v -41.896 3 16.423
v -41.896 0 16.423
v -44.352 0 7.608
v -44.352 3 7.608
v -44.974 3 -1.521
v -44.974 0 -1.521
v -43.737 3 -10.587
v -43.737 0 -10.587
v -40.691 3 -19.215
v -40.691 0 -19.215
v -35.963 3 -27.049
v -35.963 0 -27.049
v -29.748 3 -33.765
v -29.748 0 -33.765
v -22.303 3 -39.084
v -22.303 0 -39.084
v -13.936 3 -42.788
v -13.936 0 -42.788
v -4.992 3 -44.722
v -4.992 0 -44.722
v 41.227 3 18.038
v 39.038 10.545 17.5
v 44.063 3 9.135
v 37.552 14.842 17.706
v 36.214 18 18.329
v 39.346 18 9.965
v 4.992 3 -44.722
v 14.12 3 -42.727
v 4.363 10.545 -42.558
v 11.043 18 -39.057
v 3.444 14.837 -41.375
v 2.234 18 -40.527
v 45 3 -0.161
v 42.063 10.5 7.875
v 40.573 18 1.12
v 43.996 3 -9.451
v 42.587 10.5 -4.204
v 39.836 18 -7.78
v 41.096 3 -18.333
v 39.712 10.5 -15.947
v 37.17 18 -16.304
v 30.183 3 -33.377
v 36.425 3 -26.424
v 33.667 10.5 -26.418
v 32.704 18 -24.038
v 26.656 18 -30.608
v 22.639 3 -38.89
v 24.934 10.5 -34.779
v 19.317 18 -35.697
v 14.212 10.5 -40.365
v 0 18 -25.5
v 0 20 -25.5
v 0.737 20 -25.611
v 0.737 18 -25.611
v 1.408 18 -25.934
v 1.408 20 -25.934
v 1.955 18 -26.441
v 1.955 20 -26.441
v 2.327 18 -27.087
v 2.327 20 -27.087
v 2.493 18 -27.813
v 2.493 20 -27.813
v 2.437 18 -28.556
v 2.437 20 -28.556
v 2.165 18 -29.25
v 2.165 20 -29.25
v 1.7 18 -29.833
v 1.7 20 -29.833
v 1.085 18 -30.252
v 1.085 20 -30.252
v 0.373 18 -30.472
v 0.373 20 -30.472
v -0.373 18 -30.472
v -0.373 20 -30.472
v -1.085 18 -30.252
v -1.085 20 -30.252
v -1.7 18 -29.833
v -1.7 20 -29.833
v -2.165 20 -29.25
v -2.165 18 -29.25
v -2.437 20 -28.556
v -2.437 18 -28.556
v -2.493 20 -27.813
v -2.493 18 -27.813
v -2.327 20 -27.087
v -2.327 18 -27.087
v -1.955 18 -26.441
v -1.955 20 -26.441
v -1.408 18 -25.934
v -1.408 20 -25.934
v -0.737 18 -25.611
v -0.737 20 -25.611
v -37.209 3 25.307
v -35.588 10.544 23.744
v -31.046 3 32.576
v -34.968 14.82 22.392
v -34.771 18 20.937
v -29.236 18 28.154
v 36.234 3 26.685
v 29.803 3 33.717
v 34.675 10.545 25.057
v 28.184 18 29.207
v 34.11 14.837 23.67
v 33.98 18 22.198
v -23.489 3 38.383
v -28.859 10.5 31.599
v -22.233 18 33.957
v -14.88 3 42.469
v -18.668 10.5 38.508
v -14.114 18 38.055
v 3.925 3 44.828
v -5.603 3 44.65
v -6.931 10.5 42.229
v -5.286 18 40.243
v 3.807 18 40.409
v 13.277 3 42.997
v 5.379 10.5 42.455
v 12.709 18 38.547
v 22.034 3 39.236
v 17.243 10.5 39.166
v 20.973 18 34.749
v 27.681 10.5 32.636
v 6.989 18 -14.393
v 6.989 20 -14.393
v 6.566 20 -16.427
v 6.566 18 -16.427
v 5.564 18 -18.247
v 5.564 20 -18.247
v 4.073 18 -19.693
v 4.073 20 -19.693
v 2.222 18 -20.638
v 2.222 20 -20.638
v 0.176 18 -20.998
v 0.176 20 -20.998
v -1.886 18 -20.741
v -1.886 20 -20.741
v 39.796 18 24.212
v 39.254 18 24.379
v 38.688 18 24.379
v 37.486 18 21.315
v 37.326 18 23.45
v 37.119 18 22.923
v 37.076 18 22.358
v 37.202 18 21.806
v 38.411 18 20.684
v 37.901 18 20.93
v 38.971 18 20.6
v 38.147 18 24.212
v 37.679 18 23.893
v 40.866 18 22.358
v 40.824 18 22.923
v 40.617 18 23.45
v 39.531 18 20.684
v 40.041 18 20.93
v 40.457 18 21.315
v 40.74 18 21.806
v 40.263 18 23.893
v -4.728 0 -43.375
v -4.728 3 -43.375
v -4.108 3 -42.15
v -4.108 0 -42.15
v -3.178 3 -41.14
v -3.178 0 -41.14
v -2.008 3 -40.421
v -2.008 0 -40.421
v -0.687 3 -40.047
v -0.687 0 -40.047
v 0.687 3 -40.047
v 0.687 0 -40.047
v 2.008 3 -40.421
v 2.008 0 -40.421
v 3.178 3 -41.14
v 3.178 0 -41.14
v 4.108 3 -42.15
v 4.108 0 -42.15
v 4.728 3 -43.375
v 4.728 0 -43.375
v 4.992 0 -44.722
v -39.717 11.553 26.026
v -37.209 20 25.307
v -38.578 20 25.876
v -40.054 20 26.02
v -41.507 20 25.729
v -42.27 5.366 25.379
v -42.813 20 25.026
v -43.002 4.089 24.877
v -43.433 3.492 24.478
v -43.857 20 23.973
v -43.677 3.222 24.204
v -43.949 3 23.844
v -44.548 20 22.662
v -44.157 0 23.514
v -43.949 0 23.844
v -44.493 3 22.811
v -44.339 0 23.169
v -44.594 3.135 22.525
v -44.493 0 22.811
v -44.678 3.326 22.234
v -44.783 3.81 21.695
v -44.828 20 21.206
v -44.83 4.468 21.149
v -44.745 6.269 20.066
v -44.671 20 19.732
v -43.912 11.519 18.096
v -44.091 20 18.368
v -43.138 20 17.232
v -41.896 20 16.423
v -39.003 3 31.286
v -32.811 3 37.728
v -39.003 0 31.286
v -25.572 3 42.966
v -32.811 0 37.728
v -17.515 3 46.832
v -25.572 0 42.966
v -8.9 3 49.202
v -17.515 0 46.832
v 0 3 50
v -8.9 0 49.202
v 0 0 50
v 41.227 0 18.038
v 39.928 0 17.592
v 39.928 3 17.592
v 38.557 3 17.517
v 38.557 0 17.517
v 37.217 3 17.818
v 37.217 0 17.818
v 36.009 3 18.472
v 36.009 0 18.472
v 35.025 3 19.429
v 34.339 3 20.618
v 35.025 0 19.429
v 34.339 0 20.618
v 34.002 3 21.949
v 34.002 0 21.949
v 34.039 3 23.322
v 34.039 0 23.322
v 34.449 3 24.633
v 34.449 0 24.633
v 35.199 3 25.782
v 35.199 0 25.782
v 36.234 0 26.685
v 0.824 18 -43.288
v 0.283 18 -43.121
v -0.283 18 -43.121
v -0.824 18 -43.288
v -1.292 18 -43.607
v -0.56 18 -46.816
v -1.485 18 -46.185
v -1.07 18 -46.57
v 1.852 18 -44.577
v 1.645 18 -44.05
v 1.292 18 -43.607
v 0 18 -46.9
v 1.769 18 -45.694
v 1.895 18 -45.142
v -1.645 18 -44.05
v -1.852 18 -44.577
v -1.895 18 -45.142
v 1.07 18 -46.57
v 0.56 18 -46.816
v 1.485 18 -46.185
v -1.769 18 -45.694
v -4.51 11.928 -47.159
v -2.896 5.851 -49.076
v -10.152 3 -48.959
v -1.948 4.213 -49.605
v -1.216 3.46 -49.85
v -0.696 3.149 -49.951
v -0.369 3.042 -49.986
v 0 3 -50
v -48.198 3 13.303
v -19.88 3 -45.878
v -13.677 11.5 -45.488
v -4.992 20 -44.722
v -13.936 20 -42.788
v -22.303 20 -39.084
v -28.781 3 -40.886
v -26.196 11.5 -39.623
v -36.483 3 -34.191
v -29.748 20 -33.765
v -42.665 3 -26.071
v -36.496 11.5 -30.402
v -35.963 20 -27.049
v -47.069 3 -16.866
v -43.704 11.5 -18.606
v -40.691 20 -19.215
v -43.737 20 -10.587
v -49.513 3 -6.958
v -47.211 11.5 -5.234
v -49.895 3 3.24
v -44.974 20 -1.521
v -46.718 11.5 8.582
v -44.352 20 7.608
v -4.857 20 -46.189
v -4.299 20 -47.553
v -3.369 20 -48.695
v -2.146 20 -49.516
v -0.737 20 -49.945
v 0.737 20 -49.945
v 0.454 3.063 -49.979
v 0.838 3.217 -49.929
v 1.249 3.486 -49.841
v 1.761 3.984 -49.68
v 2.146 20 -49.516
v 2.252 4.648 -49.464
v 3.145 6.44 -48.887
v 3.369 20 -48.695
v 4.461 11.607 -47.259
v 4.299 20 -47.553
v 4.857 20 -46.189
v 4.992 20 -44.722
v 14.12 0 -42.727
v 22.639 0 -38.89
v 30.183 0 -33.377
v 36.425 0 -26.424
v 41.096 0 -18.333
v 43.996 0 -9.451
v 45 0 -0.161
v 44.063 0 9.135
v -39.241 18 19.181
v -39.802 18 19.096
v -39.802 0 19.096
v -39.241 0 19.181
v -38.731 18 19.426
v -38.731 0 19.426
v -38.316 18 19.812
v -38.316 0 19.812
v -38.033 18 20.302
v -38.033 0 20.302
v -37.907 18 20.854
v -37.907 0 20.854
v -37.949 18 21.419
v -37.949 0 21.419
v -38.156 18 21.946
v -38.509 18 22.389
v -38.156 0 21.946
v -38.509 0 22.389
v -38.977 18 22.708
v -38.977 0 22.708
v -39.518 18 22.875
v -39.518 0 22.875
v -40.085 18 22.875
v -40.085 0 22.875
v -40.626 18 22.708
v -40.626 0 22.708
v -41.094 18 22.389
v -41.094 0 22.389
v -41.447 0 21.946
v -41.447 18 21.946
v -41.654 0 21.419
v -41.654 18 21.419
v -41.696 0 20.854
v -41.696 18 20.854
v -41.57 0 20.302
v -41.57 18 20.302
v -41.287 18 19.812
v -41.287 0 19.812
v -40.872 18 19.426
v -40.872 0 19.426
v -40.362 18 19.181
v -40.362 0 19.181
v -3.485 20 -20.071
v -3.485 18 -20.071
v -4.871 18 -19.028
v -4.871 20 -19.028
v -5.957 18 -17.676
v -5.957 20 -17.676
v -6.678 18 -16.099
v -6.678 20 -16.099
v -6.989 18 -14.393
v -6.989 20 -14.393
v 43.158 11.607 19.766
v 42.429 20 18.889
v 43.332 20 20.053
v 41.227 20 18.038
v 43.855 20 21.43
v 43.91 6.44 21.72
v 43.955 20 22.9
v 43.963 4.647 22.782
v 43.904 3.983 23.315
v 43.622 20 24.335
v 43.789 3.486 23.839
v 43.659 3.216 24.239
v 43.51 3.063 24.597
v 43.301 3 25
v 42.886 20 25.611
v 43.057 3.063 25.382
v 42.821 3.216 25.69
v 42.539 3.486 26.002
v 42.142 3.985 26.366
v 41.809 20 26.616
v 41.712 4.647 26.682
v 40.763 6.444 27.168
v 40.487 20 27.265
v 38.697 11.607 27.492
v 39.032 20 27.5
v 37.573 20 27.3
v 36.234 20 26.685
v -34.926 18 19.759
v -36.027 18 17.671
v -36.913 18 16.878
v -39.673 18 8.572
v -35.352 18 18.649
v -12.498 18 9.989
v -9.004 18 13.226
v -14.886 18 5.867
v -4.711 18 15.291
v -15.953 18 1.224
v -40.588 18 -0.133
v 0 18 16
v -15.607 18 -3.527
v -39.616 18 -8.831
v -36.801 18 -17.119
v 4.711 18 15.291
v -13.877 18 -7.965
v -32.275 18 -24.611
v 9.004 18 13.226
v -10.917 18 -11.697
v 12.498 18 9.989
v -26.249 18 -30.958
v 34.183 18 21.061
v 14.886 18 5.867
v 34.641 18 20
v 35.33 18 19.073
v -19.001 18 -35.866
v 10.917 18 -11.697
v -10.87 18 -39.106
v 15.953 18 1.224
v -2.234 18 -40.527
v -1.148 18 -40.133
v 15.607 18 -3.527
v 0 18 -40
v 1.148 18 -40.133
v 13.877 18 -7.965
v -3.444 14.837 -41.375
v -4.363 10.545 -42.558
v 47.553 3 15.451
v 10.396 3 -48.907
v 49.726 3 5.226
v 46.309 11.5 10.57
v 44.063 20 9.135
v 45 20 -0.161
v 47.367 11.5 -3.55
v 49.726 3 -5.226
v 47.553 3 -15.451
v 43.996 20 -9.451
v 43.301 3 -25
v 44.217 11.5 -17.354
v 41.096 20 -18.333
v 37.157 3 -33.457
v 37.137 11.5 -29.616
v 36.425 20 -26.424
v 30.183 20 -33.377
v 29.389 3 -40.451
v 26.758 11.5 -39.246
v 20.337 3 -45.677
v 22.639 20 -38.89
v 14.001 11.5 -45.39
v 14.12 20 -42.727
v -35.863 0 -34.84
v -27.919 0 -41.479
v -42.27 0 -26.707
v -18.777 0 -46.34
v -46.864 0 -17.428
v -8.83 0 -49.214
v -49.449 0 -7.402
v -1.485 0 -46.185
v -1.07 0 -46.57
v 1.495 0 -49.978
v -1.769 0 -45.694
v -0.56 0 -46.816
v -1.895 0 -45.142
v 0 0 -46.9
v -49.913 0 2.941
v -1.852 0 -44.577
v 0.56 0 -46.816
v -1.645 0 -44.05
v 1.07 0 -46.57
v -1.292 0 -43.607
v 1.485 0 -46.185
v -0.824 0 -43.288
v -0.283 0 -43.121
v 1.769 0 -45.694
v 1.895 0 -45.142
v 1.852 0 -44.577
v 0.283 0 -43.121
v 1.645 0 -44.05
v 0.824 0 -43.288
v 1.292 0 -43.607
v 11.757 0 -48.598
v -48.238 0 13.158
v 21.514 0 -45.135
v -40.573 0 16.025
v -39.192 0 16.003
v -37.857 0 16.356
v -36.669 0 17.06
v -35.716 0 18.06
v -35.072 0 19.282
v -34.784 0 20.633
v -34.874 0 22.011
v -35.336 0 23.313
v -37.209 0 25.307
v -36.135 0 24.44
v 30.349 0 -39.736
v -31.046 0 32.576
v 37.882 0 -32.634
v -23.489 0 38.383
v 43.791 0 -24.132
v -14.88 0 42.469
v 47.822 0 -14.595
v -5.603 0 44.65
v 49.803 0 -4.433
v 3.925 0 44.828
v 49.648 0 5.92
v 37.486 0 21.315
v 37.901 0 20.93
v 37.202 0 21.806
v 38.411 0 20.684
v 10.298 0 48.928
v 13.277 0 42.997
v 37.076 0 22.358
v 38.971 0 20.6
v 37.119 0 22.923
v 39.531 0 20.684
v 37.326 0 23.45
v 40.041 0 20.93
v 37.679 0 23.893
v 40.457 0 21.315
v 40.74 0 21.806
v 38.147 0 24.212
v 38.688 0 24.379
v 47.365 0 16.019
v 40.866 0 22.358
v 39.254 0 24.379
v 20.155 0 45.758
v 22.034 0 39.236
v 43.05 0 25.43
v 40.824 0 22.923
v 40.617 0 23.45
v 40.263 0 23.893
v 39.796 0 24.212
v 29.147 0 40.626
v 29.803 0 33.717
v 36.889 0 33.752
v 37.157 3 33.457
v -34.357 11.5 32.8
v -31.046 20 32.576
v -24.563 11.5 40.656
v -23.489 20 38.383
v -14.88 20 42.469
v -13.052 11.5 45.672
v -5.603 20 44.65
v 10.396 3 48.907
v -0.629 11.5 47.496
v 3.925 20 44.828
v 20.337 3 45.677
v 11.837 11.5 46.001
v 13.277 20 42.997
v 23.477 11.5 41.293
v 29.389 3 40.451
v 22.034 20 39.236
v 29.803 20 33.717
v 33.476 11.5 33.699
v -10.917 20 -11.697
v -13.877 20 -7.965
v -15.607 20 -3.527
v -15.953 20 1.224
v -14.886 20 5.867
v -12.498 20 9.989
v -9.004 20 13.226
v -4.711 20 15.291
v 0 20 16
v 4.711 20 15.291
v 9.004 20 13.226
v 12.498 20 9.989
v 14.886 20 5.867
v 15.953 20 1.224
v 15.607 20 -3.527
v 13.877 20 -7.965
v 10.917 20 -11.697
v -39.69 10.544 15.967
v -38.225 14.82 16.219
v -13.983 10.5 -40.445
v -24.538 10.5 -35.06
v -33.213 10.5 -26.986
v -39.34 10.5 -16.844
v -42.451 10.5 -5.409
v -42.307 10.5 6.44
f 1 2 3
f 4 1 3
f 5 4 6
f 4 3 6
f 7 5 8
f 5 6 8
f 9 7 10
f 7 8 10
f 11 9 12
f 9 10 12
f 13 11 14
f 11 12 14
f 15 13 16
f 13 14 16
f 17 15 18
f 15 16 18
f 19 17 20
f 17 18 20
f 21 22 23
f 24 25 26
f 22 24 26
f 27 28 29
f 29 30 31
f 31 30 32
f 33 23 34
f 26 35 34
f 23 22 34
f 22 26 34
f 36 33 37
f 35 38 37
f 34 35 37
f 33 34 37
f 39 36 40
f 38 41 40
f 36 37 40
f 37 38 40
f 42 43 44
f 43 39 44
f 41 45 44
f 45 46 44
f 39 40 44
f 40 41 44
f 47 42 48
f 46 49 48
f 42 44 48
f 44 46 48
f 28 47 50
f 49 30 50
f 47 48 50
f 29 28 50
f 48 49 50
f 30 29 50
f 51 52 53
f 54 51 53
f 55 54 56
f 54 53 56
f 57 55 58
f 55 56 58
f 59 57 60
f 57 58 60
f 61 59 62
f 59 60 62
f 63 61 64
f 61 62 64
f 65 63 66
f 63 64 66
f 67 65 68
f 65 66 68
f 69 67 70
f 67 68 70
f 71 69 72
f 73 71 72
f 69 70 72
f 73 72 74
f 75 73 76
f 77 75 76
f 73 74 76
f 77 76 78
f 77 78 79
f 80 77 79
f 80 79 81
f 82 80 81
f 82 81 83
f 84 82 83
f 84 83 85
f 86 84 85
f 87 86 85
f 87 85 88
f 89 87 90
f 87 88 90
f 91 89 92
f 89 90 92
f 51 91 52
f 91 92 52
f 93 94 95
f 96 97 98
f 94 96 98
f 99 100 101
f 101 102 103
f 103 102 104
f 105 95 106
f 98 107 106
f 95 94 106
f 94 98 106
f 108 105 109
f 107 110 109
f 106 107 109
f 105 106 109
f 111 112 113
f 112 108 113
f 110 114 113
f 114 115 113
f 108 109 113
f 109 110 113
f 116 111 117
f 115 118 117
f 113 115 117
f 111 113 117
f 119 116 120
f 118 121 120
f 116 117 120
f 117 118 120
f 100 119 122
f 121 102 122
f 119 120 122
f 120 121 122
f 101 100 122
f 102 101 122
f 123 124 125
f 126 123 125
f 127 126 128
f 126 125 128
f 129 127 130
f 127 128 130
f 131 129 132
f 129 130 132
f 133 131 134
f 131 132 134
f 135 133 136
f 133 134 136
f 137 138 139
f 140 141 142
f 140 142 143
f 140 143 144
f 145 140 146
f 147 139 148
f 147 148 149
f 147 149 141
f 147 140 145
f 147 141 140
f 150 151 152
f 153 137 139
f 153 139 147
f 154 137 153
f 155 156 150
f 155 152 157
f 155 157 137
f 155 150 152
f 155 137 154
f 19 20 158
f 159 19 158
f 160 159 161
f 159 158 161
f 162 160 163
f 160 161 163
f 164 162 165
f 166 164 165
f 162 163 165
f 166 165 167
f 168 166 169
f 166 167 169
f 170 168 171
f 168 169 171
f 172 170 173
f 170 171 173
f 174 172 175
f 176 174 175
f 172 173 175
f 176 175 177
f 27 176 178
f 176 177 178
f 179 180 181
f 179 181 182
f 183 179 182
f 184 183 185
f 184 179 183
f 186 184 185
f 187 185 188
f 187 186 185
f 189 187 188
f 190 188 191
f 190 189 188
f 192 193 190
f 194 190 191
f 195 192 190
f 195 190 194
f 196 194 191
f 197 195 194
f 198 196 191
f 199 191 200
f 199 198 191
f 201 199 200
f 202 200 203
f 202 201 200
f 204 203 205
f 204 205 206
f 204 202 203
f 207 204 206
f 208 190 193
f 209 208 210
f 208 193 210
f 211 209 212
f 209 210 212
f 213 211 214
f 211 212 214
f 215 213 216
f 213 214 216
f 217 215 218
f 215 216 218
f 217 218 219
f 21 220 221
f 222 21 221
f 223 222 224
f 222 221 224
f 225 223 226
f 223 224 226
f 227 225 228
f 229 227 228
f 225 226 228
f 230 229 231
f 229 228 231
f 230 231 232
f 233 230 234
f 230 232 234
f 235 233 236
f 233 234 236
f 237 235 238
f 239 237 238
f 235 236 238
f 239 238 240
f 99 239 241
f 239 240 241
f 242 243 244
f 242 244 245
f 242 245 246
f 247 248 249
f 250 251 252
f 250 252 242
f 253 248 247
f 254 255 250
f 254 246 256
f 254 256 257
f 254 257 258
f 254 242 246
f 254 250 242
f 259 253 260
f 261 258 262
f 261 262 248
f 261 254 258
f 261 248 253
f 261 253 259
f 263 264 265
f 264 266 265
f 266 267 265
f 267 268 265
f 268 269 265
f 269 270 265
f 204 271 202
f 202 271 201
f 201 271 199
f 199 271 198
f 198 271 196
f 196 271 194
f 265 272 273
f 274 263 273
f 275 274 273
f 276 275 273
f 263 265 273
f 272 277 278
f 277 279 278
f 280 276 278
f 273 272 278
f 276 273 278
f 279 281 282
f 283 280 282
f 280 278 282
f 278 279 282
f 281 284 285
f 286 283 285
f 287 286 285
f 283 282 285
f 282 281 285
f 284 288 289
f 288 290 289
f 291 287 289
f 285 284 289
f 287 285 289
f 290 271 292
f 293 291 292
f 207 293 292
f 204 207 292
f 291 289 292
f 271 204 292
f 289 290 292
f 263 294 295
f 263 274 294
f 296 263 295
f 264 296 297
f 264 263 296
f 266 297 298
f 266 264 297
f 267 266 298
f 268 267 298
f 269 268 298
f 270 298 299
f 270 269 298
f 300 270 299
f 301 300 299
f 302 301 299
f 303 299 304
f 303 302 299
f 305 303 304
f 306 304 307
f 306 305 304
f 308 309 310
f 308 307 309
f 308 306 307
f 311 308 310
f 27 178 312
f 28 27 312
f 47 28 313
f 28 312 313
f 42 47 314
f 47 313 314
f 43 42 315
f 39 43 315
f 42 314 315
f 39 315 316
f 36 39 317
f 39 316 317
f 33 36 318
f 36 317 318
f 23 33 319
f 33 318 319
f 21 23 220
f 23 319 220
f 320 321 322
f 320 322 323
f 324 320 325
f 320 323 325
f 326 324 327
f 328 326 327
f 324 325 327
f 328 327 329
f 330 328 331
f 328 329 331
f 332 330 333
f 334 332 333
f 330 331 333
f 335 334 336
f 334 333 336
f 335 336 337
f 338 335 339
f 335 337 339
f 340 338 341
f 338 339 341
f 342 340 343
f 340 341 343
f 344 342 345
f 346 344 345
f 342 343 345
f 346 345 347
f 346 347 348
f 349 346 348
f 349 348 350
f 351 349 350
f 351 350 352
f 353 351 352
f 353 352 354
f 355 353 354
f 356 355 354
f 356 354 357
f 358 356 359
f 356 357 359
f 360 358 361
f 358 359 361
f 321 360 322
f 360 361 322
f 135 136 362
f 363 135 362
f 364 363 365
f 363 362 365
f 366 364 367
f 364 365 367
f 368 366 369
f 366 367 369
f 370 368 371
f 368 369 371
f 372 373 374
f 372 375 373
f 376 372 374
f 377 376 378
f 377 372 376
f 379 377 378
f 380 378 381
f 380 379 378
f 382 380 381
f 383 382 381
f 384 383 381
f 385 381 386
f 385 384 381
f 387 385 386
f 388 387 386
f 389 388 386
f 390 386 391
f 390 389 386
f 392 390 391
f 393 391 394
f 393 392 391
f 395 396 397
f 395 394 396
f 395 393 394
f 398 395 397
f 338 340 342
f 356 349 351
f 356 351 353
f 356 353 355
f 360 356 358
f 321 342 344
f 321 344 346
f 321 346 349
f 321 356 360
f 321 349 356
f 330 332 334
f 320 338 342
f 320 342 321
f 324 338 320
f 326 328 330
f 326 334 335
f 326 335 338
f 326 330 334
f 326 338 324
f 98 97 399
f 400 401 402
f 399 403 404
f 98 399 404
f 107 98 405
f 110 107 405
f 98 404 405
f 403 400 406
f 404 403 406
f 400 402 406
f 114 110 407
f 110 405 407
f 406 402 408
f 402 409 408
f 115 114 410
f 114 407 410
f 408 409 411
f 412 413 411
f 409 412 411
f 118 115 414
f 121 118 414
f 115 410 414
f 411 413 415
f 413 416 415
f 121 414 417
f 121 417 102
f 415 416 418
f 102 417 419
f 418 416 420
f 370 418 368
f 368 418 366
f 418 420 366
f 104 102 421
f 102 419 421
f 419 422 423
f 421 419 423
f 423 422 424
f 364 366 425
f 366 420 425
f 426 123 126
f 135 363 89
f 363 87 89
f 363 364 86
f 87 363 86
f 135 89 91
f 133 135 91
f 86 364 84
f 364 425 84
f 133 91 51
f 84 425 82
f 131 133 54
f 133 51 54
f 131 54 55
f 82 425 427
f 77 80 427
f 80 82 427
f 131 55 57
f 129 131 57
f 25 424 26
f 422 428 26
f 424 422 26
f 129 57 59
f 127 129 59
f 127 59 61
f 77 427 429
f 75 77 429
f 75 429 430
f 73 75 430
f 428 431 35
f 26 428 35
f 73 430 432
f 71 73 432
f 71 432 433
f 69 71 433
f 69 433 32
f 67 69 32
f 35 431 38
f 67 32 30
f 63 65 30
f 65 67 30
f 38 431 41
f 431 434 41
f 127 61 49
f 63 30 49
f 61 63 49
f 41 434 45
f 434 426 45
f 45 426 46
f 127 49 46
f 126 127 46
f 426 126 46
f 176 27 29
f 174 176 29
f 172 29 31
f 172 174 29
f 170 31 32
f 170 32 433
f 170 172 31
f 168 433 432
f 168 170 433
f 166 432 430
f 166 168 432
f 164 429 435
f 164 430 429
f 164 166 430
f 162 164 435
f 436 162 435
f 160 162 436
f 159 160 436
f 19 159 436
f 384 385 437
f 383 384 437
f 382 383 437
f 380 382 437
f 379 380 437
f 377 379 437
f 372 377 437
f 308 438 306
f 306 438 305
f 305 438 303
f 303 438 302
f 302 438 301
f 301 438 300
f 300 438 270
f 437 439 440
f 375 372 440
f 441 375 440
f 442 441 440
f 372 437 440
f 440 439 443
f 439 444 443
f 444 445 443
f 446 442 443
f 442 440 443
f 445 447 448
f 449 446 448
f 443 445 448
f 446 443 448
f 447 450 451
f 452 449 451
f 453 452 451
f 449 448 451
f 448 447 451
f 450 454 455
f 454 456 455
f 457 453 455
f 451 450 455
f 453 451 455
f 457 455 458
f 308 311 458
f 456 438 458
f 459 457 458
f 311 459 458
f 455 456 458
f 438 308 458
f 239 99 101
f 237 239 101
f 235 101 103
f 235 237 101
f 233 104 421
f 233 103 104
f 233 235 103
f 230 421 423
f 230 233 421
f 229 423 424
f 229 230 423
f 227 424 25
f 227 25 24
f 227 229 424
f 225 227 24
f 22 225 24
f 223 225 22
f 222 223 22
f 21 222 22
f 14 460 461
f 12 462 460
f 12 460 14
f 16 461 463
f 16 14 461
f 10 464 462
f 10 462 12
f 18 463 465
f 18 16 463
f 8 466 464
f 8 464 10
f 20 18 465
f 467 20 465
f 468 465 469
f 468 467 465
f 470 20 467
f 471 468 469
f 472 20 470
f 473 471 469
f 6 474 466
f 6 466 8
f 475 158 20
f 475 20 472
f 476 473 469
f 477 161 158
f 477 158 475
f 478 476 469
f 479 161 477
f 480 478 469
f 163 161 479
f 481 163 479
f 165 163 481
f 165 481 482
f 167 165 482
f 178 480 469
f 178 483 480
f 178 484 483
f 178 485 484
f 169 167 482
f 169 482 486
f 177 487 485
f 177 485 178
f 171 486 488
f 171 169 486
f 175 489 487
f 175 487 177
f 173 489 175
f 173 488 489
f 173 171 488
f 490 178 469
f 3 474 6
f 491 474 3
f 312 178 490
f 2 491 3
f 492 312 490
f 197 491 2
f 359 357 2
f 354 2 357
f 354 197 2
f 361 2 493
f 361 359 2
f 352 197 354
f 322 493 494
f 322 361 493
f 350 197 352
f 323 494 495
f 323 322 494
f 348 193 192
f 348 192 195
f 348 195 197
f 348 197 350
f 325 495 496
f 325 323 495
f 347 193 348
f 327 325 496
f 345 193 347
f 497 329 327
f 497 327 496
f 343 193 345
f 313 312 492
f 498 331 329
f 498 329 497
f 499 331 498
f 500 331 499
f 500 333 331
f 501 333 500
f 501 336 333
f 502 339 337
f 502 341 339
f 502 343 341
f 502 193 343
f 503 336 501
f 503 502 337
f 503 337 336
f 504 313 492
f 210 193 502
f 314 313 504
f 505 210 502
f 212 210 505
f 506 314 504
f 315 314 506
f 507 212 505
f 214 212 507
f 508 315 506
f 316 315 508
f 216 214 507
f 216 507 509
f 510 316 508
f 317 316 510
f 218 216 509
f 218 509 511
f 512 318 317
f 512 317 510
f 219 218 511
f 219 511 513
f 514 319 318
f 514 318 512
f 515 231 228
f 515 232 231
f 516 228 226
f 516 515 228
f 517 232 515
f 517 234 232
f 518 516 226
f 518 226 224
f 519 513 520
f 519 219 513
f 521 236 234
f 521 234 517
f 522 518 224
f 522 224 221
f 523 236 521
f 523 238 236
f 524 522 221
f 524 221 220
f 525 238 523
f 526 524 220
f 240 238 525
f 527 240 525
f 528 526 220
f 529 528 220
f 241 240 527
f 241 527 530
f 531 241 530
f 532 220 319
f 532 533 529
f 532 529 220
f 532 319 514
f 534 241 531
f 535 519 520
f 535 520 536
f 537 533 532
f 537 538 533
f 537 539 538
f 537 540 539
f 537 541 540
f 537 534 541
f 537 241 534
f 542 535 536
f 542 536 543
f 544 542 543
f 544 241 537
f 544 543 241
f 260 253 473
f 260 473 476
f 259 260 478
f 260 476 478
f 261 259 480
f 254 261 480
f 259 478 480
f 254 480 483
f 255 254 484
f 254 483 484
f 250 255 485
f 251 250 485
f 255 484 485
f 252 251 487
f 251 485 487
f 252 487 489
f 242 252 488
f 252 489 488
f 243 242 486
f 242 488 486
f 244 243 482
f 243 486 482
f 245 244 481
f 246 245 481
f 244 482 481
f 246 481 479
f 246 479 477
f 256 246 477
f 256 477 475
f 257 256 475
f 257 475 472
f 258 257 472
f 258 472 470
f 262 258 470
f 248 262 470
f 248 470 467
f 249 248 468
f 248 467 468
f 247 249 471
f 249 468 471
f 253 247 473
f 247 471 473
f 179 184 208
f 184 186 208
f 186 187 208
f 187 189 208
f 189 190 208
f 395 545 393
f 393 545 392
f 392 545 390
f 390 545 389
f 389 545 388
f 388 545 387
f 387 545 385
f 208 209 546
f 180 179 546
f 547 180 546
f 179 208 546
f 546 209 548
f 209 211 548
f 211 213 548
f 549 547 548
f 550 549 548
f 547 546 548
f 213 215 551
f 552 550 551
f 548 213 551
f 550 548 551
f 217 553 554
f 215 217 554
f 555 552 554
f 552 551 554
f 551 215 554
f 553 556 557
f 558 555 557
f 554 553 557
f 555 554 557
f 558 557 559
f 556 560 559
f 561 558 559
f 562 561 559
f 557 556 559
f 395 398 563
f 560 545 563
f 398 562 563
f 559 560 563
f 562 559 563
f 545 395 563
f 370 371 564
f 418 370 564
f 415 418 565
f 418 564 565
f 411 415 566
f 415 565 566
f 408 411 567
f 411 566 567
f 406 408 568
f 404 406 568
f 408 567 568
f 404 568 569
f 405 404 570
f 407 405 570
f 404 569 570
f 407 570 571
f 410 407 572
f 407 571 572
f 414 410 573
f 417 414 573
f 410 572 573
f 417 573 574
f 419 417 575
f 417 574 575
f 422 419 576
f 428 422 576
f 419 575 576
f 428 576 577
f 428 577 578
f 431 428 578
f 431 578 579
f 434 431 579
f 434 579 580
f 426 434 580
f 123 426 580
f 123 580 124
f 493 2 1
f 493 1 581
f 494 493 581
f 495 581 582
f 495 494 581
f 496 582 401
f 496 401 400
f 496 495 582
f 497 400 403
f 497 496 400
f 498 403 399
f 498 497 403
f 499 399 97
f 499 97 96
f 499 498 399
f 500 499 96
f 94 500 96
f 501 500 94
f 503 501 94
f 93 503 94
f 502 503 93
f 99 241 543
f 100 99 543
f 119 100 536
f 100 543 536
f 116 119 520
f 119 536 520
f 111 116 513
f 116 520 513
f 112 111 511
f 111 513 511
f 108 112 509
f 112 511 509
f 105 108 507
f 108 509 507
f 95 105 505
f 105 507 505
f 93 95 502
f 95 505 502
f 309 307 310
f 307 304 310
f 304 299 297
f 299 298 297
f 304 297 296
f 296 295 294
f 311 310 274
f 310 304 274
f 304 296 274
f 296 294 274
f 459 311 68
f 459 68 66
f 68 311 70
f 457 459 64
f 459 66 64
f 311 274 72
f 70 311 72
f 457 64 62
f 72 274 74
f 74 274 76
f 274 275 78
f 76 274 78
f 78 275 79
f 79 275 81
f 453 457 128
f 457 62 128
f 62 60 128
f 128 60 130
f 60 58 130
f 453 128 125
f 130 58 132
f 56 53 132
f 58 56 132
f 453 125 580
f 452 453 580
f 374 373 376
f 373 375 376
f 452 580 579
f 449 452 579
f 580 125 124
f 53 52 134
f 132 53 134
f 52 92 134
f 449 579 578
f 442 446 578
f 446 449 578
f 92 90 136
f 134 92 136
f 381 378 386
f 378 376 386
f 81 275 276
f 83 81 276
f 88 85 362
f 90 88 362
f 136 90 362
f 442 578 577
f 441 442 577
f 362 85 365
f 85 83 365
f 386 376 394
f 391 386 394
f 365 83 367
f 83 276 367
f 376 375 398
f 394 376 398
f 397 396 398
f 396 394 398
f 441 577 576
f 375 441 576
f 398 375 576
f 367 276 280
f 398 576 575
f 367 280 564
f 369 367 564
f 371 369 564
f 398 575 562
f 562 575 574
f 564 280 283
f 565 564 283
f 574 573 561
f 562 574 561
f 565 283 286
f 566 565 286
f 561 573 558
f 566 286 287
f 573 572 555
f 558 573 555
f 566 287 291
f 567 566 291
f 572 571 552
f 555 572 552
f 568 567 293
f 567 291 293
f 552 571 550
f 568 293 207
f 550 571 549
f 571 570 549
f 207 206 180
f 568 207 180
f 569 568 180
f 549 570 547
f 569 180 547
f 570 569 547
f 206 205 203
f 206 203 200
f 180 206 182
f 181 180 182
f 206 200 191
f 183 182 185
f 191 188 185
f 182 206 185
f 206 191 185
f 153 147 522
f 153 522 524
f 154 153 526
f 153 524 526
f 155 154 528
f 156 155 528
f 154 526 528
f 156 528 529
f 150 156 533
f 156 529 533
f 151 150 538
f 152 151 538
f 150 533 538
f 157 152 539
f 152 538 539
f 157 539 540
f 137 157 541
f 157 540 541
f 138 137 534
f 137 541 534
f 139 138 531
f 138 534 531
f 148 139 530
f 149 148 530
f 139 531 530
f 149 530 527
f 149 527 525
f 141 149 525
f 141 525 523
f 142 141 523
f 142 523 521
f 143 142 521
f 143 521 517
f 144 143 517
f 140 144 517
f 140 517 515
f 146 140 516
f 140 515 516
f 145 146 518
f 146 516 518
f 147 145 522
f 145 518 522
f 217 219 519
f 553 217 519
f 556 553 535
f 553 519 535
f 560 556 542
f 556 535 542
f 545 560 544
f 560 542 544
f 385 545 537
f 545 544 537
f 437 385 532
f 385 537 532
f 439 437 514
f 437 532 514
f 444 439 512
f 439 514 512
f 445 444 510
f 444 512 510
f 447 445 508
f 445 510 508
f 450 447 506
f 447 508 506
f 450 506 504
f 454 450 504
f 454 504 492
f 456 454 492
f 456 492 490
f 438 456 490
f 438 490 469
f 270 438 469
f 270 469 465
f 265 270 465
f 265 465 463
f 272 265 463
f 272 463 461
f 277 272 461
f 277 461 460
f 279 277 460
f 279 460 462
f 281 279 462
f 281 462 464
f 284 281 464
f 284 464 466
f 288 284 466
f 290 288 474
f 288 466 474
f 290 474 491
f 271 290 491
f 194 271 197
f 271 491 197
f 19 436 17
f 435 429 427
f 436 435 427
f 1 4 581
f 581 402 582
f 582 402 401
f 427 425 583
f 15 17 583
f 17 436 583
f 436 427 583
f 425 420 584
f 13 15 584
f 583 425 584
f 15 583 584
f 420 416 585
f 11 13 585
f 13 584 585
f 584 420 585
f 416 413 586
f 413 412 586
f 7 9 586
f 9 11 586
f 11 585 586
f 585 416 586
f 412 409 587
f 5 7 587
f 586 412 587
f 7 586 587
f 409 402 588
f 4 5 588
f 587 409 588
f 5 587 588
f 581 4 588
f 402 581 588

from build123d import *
from build123d.topology import SkipClean

# Parameters (mm, degrees)
SKIZZE1_R                       = 50
AUFSATZ_LINEAR_AUSTRAGEN1_DEPTH = 3
SKIZZE7_R                       = 5.030567549
SKIZZE7_R_2                     = 5
AUFSATZ_LINEAR_AUSTRAGEN4_DEPTH = 20
AUFSATZ_LINEAR_START            = -2
SKIZZE8_R                       = 45
AUFSATZ_LINEAR_AUSTRAGEN5_DEPTH = 2
SKIZZE9_R                       = 2.5
SCHNITT_LINEAR_AUSTRAGEN1_DEPTH = 2
SKIZZE10_R                      = 1.9
SCHNITT_LINEAR_AUSTRAGEN2_DEPTH = 18


with BuildPart() as part:
    # Skizze1 → Aufsatz-Linear austragen1 (new body)
    with BuildSketch(Plane(origin=(0, 0, 0), x_dir=(1, 0, 0), z_dir=(0, 1, 0))):
        with Locations(Location((0, 0, 0), (0, 0, 270))):
            Circle(SKIZZE1_R)
        with BuildLine():
            ThreePointArc((-4.992277988, 44.722222222), (0, 40), (4.992277988, 44.722222222))
            ThreePointArc((4.992277988, 44.722222222), (38.97114317, 22.5), (41.226719552, -18.037671551))
            ThreePointArc((41.226719552, -18.037671551), (34.641016151, -20), (36.234441564, -26.684550671))
            ThreePointArc((36.234441564, -26.684550671), (-0.858918242, -44.991802136), (-37.226514275, -25.282140632))
            ThreePointArc((-37.226514275, -25.282140632), (-35.37911937, -18.663277112), (-41.88512765, -16.451020689))
            ThreePointArc((-41.88512765, -16.451020689), (-38.534584491, 23.239746085), (-4.992277988, 44.722222222))
        make_face(mode=Mode.SUBTRACT)
    extrude(amount=AUFSATZ_LINEAR_AUSTRAGEN1_DEPTH)

    # Skizze4 → Rotation1 (revolve)
    with BuildSketch(Plane.XY, mode=Mode.PRIVATE) as rotation1_sk:
        Polygon((-45, 20), (-50, 3), (-45, 3), (-40, 20), align=None)
    revolve(rotation1_sk.sketch.rotate(Axis((0, 0, 0), (0, 1, 0)), 270), axis=Axis((0, 0, 0), (0, 1, 0)))

    # Skizze7 → Aufsatz-Linear austragen4 (add)
    with SkipClean():  # the faces are left unmerged after this step: merging them gives an invalid solid
        with BuildSketch(Plane.XZ):
            with Locations((-39.801509292, 20.996186751)):
                Circle(SKIZZE7_R)
            with Locations((0, -45)):
                Circle(SKIZZE7_R_2)
            with Locations((38.97114317, 22.5)):
                Circle(SKIZZE7_R_2)
        extrude(amount=-AUFSATZ_LINEAR_AUSTRAGEN4_DEPTH)

    # Skizze8 → Aufsatz-Linear austragen5 (add)
    with BuildSketch(Plane(origin=(0, 20, 0), x_dir=(1, 0, 0), z_dir=(0, 1, 0)).offset(AUFSATZ_LINEAR_START)):
        Circle(SKIZZE8_R)
    extrude(amount=AUFSATZ_LINEAR_AUSTRAGEN5_DEPTH)

    # Skizze9 → Schnitt-Linear austragen1 (cut)
    with BuildSketch(Plane(origin=(0, 20, 0), x_dir=(1, 0, 0), z_dir=(0, 1, 0))):
        with BuildLine():
            ThreePointArc((-1.885847319, 20.741185347), (-5.455813521, 18.385669713), (-6.988967253, 14.392857143))
            ThreePointArc((-6.988967253, 14.392857143), (0, -16), (6.988967253, 14.392857143))
            ThreePointArc((6.988967253, 14.392857143), (4.072563813, 19.693349101), (-1.885847319, 20.741185347))
        make_face()
        with Locations(Location((0, 28, 0), (0, 0, 270))):
            Circle(SKIZZE9_R)
    extrude(amount=-SCHNITT_LINEAR_AUSTRAGEN1_DEPTH, mode=Mode.SUBTRACT)

    # Skizze10 → Schnitt-Linear austragen2 (cut)
    with BuildSketch(Plane.XZ):
        with Locations(Location((-39.801509292, 20.996186751, 0), (0, 0, 270))):
            Circle(SKIZZE10_R)
        with Locations(Location((38.97114317, 22.5, 0), (0, 0, 270))):
            Circle(SKIZZE10_R)
        with Locations(Location((0, -45, 0), (0, 0, 270))):
            Circle(SKIZZE10_R)
    extrude(amount=-SCHNITT_LINEAR_AUSTRAGEN2_DEPTH, mode=Mode.SUBTRACT)


solid = part.part
